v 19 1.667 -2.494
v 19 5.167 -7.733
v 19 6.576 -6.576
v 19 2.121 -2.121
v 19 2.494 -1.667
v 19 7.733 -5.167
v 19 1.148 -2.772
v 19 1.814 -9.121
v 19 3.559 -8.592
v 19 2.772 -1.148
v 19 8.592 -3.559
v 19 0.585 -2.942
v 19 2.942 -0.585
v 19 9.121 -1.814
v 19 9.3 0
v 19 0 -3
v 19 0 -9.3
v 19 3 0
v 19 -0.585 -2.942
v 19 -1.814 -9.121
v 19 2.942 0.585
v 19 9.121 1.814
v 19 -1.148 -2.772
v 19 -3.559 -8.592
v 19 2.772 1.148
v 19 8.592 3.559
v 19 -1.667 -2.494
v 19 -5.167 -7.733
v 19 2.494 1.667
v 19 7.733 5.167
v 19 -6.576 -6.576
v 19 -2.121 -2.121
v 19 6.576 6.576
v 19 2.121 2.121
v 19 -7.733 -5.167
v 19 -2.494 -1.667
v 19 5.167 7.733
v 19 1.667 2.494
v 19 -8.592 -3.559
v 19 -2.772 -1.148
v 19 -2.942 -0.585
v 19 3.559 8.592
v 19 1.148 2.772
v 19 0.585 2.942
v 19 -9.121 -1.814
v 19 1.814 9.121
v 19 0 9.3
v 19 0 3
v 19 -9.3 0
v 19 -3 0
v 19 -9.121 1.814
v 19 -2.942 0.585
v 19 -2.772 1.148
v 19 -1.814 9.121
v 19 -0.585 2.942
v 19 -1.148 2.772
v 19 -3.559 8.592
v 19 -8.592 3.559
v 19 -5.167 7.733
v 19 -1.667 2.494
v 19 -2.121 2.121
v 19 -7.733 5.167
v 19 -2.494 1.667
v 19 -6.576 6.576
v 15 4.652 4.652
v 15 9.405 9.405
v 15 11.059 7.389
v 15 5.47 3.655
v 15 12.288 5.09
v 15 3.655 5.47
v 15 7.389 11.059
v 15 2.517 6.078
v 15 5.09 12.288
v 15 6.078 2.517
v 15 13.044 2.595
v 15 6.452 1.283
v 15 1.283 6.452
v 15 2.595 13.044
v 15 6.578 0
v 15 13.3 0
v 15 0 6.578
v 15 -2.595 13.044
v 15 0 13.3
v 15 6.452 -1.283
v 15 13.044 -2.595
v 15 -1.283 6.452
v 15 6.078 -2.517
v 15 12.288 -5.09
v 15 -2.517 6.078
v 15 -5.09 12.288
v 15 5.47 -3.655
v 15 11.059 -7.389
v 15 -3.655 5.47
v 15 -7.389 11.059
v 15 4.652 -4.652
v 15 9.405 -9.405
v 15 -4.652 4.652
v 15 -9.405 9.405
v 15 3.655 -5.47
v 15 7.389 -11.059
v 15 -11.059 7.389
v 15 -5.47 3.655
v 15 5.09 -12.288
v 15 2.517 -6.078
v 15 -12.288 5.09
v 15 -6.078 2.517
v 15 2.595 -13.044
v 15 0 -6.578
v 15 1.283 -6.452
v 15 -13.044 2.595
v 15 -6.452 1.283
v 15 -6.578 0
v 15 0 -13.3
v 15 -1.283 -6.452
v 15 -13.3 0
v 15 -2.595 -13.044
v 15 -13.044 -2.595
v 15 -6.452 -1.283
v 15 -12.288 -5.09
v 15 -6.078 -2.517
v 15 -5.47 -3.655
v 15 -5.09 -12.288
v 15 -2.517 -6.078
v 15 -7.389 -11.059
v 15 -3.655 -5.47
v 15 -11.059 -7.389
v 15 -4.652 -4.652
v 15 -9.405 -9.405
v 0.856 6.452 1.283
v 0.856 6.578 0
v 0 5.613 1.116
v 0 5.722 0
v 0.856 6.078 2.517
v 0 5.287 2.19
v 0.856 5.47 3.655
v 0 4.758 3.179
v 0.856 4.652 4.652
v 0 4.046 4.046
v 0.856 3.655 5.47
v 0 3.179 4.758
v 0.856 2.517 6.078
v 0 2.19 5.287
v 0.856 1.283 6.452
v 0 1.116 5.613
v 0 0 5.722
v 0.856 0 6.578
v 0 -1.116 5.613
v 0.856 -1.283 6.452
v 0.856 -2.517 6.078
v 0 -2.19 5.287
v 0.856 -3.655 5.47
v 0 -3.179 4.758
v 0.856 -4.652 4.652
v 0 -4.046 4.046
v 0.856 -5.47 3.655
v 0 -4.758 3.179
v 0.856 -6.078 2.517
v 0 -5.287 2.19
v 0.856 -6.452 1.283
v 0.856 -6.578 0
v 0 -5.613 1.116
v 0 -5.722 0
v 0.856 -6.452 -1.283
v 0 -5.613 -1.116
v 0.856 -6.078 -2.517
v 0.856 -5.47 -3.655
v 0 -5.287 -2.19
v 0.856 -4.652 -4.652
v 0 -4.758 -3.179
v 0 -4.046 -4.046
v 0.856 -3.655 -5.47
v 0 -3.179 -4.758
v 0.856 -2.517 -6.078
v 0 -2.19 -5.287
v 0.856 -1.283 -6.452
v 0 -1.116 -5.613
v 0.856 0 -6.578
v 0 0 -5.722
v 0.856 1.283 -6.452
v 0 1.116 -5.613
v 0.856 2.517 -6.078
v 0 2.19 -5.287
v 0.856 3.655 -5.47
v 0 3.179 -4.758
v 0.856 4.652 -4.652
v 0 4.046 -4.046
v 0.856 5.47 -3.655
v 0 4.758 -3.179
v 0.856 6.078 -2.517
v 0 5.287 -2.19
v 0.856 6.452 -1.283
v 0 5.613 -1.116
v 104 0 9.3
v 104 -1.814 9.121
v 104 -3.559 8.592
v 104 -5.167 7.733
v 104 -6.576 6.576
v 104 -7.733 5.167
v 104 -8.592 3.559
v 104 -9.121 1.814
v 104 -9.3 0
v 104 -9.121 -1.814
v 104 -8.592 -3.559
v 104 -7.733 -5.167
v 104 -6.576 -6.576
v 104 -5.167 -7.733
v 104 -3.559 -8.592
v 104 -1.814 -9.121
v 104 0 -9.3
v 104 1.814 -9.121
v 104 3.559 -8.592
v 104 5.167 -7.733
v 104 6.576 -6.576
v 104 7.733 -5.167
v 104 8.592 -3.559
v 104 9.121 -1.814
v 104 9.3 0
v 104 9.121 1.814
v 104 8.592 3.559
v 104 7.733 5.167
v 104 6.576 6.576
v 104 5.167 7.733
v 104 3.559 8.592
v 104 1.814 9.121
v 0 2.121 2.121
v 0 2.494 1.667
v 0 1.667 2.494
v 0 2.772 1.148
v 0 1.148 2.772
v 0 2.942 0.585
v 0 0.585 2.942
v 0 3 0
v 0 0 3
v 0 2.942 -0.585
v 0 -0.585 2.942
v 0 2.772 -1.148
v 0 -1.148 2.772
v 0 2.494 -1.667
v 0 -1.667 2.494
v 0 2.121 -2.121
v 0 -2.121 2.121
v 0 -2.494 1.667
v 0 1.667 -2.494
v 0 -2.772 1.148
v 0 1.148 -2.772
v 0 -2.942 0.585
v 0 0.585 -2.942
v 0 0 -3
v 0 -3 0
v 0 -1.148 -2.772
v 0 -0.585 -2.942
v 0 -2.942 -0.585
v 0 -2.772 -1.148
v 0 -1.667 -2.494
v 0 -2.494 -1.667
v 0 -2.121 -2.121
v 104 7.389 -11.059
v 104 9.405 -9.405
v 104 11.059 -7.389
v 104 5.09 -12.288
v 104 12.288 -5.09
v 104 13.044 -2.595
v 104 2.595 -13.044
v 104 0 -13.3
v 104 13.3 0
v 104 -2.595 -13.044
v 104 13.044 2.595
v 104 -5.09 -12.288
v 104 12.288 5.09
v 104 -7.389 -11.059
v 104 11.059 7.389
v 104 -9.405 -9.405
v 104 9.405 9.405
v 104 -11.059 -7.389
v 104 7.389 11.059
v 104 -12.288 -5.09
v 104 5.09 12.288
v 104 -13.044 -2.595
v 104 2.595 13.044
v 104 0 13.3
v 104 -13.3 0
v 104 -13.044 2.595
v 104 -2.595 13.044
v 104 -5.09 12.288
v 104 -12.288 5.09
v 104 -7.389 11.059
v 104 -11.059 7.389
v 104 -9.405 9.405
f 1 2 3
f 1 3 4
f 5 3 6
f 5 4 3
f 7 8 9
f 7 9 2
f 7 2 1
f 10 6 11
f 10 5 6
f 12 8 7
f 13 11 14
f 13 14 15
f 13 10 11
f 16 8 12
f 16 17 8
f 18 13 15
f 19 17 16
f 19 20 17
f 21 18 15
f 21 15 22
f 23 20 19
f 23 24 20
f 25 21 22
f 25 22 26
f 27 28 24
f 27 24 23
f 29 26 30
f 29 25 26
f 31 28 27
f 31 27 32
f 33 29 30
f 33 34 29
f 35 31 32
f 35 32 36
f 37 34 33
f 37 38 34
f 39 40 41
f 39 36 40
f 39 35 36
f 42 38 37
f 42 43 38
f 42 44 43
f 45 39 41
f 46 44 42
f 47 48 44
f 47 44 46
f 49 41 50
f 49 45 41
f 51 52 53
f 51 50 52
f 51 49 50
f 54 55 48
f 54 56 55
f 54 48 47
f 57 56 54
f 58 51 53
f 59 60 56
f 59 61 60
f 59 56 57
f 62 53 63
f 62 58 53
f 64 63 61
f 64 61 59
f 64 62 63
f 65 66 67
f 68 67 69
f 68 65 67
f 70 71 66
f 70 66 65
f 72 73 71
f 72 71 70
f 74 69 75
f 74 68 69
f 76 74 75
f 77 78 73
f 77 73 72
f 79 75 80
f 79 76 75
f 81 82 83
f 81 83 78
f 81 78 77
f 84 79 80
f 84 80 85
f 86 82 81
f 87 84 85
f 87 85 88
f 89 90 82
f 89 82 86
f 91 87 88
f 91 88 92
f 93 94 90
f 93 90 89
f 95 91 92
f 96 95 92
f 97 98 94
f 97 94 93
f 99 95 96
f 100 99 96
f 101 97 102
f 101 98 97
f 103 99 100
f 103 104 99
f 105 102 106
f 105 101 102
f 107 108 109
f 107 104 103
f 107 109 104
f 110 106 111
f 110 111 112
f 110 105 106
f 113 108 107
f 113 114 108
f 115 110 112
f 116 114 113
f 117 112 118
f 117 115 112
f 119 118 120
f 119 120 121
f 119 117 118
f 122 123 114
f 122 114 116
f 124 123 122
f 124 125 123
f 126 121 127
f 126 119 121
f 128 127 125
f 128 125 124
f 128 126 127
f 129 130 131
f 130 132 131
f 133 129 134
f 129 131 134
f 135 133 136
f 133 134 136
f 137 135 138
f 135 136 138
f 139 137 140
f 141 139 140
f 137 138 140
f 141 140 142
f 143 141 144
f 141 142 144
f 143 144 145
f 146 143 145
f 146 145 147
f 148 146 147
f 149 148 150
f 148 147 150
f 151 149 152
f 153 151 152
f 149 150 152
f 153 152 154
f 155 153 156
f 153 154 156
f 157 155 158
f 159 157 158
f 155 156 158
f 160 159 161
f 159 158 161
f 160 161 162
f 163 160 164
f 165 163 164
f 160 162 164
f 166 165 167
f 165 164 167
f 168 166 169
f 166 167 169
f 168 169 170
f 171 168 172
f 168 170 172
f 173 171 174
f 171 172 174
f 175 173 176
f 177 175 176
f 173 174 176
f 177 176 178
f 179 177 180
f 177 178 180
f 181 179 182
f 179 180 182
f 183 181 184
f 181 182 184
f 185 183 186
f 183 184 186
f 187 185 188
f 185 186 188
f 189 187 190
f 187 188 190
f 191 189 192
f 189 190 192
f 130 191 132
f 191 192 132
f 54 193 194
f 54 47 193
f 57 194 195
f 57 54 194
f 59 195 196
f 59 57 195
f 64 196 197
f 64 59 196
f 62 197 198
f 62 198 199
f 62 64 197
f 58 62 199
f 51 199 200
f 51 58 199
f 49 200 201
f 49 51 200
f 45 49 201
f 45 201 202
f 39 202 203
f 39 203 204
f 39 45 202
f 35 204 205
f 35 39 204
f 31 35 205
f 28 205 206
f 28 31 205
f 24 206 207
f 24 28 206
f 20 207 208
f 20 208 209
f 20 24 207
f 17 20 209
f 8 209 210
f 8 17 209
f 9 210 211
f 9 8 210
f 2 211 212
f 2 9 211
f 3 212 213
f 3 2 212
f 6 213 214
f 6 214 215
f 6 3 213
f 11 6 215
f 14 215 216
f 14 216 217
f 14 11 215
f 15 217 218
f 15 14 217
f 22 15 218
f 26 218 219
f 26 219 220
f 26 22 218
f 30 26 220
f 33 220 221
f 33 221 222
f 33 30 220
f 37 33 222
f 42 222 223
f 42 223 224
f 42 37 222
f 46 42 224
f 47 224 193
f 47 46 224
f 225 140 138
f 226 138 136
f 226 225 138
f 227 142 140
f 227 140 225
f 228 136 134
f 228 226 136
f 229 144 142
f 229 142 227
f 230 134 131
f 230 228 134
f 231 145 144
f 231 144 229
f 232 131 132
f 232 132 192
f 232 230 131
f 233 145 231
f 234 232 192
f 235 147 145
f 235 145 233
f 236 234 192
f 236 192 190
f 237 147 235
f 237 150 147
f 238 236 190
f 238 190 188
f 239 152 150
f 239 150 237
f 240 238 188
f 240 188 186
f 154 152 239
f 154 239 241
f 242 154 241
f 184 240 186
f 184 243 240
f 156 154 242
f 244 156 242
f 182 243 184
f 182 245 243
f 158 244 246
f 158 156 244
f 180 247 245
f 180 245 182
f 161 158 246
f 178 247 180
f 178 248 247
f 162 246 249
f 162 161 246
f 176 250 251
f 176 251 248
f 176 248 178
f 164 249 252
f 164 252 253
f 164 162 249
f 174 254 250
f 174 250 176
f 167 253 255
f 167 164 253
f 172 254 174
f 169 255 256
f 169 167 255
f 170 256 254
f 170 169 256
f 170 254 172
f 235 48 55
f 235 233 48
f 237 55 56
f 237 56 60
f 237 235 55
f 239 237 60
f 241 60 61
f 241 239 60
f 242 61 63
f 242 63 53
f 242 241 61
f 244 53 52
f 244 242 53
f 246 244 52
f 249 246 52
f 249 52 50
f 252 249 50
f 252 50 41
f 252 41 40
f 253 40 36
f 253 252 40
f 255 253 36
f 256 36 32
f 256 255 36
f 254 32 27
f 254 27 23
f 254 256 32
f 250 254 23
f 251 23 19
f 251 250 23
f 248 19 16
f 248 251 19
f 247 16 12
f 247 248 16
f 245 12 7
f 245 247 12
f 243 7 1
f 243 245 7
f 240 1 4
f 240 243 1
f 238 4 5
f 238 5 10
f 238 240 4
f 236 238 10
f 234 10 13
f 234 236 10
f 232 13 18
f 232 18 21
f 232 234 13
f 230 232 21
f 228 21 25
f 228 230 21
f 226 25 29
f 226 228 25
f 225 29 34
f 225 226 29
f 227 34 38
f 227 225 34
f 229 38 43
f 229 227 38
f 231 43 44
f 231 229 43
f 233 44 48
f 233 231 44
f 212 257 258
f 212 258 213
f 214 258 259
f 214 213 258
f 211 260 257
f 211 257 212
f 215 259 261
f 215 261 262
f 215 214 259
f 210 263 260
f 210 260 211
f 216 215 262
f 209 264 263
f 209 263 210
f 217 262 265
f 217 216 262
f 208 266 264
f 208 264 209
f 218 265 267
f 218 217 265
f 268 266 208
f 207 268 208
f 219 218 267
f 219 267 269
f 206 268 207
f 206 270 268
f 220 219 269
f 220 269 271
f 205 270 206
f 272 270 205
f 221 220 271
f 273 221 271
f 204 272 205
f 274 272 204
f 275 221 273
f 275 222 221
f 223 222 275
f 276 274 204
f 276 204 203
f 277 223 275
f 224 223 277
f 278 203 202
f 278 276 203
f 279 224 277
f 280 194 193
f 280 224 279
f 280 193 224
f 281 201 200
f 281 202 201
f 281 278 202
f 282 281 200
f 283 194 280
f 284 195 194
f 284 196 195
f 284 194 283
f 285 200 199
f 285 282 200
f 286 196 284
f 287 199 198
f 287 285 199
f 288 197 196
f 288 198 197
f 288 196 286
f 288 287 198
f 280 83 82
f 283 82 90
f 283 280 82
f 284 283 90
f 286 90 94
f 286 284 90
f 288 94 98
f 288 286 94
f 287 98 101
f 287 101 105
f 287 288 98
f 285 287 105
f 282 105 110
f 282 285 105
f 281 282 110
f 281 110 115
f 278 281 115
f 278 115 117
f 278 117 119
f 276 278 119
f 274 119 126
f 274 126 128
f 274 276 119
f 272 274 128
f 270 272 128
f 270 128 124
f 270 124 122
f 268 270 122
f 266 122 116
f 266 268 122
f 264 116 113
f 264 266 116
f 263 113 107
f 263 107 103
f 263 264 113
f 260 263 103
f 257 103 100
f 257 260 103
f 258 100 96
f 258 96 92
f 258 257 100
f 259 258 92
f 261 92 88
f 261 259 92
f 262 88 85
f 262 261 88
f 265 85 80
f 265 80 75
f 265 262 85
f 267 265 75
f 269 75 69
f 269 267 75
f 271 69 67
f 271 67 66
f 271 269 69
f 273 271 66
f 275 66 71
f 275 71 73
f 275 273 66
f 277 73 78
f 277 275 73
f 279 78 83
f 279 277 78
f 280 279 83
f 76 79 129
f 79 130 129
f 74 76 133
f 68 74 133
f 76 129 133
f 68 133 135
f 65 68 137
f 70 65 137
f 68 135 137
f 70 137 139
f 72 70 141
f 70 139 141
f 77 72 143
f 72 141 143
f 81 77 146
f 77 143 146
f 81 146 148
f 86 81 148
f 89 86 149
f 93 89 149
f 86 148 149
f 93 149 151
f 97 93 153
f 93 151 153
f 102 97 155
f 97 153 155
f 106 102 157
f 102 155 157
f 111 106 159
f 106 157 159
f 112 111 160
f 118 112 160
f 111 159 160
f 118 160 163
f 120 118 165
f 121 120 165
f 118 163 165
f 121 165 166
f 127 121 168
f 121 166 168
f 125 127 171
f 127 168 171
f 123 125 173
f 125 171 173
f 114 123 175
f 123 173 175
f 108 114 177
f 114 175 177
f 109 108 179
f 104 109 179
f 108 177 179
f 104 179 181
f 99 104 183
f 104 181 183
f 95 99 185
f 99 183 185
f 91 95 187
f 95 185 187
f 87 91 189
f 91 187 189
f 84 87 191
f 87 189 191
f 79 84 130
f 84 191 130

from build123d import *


# Read off the part's stored shape, not the designer's step: G1/4 Straight Pipe Tapped Thread Stud2
with BuildPart() as part:
    # Sketch1 → Revolve1 (revolve)
    with BuildSketch(Plane.XY, mode=Mode.PRIVATE) as revolve1_sk:
        Polygon((15, -13.3), (104, -13.3), (104, -9.3), (19, -9.3), (19, -3), (0, -3), (0, -7), (15, -7), align=None)
    revolve(revolve1_sk.sketch.rotate(Axis((0, 0, 0), (1, 0, 0)), 270), axis=Axis((0, 0, 0), (1, 0, 0)))

    # G1/4 Straight Pipe Tapped Thread Stud2 o → G1/4 Straight Pipe Tapped Thread Stud2 (revolve, cut)
    with BuildSketch(Plane.YX):
        Polygon((5.7225, 0), (7, 0), (7, 15), (6.5785, 15), (6.5785, 0.856), align=None)
    revolve(axis=Axis((0, 0, 0), (1, 0, 0)), mode=Mode.SUBTRACT)


solid = part.part
